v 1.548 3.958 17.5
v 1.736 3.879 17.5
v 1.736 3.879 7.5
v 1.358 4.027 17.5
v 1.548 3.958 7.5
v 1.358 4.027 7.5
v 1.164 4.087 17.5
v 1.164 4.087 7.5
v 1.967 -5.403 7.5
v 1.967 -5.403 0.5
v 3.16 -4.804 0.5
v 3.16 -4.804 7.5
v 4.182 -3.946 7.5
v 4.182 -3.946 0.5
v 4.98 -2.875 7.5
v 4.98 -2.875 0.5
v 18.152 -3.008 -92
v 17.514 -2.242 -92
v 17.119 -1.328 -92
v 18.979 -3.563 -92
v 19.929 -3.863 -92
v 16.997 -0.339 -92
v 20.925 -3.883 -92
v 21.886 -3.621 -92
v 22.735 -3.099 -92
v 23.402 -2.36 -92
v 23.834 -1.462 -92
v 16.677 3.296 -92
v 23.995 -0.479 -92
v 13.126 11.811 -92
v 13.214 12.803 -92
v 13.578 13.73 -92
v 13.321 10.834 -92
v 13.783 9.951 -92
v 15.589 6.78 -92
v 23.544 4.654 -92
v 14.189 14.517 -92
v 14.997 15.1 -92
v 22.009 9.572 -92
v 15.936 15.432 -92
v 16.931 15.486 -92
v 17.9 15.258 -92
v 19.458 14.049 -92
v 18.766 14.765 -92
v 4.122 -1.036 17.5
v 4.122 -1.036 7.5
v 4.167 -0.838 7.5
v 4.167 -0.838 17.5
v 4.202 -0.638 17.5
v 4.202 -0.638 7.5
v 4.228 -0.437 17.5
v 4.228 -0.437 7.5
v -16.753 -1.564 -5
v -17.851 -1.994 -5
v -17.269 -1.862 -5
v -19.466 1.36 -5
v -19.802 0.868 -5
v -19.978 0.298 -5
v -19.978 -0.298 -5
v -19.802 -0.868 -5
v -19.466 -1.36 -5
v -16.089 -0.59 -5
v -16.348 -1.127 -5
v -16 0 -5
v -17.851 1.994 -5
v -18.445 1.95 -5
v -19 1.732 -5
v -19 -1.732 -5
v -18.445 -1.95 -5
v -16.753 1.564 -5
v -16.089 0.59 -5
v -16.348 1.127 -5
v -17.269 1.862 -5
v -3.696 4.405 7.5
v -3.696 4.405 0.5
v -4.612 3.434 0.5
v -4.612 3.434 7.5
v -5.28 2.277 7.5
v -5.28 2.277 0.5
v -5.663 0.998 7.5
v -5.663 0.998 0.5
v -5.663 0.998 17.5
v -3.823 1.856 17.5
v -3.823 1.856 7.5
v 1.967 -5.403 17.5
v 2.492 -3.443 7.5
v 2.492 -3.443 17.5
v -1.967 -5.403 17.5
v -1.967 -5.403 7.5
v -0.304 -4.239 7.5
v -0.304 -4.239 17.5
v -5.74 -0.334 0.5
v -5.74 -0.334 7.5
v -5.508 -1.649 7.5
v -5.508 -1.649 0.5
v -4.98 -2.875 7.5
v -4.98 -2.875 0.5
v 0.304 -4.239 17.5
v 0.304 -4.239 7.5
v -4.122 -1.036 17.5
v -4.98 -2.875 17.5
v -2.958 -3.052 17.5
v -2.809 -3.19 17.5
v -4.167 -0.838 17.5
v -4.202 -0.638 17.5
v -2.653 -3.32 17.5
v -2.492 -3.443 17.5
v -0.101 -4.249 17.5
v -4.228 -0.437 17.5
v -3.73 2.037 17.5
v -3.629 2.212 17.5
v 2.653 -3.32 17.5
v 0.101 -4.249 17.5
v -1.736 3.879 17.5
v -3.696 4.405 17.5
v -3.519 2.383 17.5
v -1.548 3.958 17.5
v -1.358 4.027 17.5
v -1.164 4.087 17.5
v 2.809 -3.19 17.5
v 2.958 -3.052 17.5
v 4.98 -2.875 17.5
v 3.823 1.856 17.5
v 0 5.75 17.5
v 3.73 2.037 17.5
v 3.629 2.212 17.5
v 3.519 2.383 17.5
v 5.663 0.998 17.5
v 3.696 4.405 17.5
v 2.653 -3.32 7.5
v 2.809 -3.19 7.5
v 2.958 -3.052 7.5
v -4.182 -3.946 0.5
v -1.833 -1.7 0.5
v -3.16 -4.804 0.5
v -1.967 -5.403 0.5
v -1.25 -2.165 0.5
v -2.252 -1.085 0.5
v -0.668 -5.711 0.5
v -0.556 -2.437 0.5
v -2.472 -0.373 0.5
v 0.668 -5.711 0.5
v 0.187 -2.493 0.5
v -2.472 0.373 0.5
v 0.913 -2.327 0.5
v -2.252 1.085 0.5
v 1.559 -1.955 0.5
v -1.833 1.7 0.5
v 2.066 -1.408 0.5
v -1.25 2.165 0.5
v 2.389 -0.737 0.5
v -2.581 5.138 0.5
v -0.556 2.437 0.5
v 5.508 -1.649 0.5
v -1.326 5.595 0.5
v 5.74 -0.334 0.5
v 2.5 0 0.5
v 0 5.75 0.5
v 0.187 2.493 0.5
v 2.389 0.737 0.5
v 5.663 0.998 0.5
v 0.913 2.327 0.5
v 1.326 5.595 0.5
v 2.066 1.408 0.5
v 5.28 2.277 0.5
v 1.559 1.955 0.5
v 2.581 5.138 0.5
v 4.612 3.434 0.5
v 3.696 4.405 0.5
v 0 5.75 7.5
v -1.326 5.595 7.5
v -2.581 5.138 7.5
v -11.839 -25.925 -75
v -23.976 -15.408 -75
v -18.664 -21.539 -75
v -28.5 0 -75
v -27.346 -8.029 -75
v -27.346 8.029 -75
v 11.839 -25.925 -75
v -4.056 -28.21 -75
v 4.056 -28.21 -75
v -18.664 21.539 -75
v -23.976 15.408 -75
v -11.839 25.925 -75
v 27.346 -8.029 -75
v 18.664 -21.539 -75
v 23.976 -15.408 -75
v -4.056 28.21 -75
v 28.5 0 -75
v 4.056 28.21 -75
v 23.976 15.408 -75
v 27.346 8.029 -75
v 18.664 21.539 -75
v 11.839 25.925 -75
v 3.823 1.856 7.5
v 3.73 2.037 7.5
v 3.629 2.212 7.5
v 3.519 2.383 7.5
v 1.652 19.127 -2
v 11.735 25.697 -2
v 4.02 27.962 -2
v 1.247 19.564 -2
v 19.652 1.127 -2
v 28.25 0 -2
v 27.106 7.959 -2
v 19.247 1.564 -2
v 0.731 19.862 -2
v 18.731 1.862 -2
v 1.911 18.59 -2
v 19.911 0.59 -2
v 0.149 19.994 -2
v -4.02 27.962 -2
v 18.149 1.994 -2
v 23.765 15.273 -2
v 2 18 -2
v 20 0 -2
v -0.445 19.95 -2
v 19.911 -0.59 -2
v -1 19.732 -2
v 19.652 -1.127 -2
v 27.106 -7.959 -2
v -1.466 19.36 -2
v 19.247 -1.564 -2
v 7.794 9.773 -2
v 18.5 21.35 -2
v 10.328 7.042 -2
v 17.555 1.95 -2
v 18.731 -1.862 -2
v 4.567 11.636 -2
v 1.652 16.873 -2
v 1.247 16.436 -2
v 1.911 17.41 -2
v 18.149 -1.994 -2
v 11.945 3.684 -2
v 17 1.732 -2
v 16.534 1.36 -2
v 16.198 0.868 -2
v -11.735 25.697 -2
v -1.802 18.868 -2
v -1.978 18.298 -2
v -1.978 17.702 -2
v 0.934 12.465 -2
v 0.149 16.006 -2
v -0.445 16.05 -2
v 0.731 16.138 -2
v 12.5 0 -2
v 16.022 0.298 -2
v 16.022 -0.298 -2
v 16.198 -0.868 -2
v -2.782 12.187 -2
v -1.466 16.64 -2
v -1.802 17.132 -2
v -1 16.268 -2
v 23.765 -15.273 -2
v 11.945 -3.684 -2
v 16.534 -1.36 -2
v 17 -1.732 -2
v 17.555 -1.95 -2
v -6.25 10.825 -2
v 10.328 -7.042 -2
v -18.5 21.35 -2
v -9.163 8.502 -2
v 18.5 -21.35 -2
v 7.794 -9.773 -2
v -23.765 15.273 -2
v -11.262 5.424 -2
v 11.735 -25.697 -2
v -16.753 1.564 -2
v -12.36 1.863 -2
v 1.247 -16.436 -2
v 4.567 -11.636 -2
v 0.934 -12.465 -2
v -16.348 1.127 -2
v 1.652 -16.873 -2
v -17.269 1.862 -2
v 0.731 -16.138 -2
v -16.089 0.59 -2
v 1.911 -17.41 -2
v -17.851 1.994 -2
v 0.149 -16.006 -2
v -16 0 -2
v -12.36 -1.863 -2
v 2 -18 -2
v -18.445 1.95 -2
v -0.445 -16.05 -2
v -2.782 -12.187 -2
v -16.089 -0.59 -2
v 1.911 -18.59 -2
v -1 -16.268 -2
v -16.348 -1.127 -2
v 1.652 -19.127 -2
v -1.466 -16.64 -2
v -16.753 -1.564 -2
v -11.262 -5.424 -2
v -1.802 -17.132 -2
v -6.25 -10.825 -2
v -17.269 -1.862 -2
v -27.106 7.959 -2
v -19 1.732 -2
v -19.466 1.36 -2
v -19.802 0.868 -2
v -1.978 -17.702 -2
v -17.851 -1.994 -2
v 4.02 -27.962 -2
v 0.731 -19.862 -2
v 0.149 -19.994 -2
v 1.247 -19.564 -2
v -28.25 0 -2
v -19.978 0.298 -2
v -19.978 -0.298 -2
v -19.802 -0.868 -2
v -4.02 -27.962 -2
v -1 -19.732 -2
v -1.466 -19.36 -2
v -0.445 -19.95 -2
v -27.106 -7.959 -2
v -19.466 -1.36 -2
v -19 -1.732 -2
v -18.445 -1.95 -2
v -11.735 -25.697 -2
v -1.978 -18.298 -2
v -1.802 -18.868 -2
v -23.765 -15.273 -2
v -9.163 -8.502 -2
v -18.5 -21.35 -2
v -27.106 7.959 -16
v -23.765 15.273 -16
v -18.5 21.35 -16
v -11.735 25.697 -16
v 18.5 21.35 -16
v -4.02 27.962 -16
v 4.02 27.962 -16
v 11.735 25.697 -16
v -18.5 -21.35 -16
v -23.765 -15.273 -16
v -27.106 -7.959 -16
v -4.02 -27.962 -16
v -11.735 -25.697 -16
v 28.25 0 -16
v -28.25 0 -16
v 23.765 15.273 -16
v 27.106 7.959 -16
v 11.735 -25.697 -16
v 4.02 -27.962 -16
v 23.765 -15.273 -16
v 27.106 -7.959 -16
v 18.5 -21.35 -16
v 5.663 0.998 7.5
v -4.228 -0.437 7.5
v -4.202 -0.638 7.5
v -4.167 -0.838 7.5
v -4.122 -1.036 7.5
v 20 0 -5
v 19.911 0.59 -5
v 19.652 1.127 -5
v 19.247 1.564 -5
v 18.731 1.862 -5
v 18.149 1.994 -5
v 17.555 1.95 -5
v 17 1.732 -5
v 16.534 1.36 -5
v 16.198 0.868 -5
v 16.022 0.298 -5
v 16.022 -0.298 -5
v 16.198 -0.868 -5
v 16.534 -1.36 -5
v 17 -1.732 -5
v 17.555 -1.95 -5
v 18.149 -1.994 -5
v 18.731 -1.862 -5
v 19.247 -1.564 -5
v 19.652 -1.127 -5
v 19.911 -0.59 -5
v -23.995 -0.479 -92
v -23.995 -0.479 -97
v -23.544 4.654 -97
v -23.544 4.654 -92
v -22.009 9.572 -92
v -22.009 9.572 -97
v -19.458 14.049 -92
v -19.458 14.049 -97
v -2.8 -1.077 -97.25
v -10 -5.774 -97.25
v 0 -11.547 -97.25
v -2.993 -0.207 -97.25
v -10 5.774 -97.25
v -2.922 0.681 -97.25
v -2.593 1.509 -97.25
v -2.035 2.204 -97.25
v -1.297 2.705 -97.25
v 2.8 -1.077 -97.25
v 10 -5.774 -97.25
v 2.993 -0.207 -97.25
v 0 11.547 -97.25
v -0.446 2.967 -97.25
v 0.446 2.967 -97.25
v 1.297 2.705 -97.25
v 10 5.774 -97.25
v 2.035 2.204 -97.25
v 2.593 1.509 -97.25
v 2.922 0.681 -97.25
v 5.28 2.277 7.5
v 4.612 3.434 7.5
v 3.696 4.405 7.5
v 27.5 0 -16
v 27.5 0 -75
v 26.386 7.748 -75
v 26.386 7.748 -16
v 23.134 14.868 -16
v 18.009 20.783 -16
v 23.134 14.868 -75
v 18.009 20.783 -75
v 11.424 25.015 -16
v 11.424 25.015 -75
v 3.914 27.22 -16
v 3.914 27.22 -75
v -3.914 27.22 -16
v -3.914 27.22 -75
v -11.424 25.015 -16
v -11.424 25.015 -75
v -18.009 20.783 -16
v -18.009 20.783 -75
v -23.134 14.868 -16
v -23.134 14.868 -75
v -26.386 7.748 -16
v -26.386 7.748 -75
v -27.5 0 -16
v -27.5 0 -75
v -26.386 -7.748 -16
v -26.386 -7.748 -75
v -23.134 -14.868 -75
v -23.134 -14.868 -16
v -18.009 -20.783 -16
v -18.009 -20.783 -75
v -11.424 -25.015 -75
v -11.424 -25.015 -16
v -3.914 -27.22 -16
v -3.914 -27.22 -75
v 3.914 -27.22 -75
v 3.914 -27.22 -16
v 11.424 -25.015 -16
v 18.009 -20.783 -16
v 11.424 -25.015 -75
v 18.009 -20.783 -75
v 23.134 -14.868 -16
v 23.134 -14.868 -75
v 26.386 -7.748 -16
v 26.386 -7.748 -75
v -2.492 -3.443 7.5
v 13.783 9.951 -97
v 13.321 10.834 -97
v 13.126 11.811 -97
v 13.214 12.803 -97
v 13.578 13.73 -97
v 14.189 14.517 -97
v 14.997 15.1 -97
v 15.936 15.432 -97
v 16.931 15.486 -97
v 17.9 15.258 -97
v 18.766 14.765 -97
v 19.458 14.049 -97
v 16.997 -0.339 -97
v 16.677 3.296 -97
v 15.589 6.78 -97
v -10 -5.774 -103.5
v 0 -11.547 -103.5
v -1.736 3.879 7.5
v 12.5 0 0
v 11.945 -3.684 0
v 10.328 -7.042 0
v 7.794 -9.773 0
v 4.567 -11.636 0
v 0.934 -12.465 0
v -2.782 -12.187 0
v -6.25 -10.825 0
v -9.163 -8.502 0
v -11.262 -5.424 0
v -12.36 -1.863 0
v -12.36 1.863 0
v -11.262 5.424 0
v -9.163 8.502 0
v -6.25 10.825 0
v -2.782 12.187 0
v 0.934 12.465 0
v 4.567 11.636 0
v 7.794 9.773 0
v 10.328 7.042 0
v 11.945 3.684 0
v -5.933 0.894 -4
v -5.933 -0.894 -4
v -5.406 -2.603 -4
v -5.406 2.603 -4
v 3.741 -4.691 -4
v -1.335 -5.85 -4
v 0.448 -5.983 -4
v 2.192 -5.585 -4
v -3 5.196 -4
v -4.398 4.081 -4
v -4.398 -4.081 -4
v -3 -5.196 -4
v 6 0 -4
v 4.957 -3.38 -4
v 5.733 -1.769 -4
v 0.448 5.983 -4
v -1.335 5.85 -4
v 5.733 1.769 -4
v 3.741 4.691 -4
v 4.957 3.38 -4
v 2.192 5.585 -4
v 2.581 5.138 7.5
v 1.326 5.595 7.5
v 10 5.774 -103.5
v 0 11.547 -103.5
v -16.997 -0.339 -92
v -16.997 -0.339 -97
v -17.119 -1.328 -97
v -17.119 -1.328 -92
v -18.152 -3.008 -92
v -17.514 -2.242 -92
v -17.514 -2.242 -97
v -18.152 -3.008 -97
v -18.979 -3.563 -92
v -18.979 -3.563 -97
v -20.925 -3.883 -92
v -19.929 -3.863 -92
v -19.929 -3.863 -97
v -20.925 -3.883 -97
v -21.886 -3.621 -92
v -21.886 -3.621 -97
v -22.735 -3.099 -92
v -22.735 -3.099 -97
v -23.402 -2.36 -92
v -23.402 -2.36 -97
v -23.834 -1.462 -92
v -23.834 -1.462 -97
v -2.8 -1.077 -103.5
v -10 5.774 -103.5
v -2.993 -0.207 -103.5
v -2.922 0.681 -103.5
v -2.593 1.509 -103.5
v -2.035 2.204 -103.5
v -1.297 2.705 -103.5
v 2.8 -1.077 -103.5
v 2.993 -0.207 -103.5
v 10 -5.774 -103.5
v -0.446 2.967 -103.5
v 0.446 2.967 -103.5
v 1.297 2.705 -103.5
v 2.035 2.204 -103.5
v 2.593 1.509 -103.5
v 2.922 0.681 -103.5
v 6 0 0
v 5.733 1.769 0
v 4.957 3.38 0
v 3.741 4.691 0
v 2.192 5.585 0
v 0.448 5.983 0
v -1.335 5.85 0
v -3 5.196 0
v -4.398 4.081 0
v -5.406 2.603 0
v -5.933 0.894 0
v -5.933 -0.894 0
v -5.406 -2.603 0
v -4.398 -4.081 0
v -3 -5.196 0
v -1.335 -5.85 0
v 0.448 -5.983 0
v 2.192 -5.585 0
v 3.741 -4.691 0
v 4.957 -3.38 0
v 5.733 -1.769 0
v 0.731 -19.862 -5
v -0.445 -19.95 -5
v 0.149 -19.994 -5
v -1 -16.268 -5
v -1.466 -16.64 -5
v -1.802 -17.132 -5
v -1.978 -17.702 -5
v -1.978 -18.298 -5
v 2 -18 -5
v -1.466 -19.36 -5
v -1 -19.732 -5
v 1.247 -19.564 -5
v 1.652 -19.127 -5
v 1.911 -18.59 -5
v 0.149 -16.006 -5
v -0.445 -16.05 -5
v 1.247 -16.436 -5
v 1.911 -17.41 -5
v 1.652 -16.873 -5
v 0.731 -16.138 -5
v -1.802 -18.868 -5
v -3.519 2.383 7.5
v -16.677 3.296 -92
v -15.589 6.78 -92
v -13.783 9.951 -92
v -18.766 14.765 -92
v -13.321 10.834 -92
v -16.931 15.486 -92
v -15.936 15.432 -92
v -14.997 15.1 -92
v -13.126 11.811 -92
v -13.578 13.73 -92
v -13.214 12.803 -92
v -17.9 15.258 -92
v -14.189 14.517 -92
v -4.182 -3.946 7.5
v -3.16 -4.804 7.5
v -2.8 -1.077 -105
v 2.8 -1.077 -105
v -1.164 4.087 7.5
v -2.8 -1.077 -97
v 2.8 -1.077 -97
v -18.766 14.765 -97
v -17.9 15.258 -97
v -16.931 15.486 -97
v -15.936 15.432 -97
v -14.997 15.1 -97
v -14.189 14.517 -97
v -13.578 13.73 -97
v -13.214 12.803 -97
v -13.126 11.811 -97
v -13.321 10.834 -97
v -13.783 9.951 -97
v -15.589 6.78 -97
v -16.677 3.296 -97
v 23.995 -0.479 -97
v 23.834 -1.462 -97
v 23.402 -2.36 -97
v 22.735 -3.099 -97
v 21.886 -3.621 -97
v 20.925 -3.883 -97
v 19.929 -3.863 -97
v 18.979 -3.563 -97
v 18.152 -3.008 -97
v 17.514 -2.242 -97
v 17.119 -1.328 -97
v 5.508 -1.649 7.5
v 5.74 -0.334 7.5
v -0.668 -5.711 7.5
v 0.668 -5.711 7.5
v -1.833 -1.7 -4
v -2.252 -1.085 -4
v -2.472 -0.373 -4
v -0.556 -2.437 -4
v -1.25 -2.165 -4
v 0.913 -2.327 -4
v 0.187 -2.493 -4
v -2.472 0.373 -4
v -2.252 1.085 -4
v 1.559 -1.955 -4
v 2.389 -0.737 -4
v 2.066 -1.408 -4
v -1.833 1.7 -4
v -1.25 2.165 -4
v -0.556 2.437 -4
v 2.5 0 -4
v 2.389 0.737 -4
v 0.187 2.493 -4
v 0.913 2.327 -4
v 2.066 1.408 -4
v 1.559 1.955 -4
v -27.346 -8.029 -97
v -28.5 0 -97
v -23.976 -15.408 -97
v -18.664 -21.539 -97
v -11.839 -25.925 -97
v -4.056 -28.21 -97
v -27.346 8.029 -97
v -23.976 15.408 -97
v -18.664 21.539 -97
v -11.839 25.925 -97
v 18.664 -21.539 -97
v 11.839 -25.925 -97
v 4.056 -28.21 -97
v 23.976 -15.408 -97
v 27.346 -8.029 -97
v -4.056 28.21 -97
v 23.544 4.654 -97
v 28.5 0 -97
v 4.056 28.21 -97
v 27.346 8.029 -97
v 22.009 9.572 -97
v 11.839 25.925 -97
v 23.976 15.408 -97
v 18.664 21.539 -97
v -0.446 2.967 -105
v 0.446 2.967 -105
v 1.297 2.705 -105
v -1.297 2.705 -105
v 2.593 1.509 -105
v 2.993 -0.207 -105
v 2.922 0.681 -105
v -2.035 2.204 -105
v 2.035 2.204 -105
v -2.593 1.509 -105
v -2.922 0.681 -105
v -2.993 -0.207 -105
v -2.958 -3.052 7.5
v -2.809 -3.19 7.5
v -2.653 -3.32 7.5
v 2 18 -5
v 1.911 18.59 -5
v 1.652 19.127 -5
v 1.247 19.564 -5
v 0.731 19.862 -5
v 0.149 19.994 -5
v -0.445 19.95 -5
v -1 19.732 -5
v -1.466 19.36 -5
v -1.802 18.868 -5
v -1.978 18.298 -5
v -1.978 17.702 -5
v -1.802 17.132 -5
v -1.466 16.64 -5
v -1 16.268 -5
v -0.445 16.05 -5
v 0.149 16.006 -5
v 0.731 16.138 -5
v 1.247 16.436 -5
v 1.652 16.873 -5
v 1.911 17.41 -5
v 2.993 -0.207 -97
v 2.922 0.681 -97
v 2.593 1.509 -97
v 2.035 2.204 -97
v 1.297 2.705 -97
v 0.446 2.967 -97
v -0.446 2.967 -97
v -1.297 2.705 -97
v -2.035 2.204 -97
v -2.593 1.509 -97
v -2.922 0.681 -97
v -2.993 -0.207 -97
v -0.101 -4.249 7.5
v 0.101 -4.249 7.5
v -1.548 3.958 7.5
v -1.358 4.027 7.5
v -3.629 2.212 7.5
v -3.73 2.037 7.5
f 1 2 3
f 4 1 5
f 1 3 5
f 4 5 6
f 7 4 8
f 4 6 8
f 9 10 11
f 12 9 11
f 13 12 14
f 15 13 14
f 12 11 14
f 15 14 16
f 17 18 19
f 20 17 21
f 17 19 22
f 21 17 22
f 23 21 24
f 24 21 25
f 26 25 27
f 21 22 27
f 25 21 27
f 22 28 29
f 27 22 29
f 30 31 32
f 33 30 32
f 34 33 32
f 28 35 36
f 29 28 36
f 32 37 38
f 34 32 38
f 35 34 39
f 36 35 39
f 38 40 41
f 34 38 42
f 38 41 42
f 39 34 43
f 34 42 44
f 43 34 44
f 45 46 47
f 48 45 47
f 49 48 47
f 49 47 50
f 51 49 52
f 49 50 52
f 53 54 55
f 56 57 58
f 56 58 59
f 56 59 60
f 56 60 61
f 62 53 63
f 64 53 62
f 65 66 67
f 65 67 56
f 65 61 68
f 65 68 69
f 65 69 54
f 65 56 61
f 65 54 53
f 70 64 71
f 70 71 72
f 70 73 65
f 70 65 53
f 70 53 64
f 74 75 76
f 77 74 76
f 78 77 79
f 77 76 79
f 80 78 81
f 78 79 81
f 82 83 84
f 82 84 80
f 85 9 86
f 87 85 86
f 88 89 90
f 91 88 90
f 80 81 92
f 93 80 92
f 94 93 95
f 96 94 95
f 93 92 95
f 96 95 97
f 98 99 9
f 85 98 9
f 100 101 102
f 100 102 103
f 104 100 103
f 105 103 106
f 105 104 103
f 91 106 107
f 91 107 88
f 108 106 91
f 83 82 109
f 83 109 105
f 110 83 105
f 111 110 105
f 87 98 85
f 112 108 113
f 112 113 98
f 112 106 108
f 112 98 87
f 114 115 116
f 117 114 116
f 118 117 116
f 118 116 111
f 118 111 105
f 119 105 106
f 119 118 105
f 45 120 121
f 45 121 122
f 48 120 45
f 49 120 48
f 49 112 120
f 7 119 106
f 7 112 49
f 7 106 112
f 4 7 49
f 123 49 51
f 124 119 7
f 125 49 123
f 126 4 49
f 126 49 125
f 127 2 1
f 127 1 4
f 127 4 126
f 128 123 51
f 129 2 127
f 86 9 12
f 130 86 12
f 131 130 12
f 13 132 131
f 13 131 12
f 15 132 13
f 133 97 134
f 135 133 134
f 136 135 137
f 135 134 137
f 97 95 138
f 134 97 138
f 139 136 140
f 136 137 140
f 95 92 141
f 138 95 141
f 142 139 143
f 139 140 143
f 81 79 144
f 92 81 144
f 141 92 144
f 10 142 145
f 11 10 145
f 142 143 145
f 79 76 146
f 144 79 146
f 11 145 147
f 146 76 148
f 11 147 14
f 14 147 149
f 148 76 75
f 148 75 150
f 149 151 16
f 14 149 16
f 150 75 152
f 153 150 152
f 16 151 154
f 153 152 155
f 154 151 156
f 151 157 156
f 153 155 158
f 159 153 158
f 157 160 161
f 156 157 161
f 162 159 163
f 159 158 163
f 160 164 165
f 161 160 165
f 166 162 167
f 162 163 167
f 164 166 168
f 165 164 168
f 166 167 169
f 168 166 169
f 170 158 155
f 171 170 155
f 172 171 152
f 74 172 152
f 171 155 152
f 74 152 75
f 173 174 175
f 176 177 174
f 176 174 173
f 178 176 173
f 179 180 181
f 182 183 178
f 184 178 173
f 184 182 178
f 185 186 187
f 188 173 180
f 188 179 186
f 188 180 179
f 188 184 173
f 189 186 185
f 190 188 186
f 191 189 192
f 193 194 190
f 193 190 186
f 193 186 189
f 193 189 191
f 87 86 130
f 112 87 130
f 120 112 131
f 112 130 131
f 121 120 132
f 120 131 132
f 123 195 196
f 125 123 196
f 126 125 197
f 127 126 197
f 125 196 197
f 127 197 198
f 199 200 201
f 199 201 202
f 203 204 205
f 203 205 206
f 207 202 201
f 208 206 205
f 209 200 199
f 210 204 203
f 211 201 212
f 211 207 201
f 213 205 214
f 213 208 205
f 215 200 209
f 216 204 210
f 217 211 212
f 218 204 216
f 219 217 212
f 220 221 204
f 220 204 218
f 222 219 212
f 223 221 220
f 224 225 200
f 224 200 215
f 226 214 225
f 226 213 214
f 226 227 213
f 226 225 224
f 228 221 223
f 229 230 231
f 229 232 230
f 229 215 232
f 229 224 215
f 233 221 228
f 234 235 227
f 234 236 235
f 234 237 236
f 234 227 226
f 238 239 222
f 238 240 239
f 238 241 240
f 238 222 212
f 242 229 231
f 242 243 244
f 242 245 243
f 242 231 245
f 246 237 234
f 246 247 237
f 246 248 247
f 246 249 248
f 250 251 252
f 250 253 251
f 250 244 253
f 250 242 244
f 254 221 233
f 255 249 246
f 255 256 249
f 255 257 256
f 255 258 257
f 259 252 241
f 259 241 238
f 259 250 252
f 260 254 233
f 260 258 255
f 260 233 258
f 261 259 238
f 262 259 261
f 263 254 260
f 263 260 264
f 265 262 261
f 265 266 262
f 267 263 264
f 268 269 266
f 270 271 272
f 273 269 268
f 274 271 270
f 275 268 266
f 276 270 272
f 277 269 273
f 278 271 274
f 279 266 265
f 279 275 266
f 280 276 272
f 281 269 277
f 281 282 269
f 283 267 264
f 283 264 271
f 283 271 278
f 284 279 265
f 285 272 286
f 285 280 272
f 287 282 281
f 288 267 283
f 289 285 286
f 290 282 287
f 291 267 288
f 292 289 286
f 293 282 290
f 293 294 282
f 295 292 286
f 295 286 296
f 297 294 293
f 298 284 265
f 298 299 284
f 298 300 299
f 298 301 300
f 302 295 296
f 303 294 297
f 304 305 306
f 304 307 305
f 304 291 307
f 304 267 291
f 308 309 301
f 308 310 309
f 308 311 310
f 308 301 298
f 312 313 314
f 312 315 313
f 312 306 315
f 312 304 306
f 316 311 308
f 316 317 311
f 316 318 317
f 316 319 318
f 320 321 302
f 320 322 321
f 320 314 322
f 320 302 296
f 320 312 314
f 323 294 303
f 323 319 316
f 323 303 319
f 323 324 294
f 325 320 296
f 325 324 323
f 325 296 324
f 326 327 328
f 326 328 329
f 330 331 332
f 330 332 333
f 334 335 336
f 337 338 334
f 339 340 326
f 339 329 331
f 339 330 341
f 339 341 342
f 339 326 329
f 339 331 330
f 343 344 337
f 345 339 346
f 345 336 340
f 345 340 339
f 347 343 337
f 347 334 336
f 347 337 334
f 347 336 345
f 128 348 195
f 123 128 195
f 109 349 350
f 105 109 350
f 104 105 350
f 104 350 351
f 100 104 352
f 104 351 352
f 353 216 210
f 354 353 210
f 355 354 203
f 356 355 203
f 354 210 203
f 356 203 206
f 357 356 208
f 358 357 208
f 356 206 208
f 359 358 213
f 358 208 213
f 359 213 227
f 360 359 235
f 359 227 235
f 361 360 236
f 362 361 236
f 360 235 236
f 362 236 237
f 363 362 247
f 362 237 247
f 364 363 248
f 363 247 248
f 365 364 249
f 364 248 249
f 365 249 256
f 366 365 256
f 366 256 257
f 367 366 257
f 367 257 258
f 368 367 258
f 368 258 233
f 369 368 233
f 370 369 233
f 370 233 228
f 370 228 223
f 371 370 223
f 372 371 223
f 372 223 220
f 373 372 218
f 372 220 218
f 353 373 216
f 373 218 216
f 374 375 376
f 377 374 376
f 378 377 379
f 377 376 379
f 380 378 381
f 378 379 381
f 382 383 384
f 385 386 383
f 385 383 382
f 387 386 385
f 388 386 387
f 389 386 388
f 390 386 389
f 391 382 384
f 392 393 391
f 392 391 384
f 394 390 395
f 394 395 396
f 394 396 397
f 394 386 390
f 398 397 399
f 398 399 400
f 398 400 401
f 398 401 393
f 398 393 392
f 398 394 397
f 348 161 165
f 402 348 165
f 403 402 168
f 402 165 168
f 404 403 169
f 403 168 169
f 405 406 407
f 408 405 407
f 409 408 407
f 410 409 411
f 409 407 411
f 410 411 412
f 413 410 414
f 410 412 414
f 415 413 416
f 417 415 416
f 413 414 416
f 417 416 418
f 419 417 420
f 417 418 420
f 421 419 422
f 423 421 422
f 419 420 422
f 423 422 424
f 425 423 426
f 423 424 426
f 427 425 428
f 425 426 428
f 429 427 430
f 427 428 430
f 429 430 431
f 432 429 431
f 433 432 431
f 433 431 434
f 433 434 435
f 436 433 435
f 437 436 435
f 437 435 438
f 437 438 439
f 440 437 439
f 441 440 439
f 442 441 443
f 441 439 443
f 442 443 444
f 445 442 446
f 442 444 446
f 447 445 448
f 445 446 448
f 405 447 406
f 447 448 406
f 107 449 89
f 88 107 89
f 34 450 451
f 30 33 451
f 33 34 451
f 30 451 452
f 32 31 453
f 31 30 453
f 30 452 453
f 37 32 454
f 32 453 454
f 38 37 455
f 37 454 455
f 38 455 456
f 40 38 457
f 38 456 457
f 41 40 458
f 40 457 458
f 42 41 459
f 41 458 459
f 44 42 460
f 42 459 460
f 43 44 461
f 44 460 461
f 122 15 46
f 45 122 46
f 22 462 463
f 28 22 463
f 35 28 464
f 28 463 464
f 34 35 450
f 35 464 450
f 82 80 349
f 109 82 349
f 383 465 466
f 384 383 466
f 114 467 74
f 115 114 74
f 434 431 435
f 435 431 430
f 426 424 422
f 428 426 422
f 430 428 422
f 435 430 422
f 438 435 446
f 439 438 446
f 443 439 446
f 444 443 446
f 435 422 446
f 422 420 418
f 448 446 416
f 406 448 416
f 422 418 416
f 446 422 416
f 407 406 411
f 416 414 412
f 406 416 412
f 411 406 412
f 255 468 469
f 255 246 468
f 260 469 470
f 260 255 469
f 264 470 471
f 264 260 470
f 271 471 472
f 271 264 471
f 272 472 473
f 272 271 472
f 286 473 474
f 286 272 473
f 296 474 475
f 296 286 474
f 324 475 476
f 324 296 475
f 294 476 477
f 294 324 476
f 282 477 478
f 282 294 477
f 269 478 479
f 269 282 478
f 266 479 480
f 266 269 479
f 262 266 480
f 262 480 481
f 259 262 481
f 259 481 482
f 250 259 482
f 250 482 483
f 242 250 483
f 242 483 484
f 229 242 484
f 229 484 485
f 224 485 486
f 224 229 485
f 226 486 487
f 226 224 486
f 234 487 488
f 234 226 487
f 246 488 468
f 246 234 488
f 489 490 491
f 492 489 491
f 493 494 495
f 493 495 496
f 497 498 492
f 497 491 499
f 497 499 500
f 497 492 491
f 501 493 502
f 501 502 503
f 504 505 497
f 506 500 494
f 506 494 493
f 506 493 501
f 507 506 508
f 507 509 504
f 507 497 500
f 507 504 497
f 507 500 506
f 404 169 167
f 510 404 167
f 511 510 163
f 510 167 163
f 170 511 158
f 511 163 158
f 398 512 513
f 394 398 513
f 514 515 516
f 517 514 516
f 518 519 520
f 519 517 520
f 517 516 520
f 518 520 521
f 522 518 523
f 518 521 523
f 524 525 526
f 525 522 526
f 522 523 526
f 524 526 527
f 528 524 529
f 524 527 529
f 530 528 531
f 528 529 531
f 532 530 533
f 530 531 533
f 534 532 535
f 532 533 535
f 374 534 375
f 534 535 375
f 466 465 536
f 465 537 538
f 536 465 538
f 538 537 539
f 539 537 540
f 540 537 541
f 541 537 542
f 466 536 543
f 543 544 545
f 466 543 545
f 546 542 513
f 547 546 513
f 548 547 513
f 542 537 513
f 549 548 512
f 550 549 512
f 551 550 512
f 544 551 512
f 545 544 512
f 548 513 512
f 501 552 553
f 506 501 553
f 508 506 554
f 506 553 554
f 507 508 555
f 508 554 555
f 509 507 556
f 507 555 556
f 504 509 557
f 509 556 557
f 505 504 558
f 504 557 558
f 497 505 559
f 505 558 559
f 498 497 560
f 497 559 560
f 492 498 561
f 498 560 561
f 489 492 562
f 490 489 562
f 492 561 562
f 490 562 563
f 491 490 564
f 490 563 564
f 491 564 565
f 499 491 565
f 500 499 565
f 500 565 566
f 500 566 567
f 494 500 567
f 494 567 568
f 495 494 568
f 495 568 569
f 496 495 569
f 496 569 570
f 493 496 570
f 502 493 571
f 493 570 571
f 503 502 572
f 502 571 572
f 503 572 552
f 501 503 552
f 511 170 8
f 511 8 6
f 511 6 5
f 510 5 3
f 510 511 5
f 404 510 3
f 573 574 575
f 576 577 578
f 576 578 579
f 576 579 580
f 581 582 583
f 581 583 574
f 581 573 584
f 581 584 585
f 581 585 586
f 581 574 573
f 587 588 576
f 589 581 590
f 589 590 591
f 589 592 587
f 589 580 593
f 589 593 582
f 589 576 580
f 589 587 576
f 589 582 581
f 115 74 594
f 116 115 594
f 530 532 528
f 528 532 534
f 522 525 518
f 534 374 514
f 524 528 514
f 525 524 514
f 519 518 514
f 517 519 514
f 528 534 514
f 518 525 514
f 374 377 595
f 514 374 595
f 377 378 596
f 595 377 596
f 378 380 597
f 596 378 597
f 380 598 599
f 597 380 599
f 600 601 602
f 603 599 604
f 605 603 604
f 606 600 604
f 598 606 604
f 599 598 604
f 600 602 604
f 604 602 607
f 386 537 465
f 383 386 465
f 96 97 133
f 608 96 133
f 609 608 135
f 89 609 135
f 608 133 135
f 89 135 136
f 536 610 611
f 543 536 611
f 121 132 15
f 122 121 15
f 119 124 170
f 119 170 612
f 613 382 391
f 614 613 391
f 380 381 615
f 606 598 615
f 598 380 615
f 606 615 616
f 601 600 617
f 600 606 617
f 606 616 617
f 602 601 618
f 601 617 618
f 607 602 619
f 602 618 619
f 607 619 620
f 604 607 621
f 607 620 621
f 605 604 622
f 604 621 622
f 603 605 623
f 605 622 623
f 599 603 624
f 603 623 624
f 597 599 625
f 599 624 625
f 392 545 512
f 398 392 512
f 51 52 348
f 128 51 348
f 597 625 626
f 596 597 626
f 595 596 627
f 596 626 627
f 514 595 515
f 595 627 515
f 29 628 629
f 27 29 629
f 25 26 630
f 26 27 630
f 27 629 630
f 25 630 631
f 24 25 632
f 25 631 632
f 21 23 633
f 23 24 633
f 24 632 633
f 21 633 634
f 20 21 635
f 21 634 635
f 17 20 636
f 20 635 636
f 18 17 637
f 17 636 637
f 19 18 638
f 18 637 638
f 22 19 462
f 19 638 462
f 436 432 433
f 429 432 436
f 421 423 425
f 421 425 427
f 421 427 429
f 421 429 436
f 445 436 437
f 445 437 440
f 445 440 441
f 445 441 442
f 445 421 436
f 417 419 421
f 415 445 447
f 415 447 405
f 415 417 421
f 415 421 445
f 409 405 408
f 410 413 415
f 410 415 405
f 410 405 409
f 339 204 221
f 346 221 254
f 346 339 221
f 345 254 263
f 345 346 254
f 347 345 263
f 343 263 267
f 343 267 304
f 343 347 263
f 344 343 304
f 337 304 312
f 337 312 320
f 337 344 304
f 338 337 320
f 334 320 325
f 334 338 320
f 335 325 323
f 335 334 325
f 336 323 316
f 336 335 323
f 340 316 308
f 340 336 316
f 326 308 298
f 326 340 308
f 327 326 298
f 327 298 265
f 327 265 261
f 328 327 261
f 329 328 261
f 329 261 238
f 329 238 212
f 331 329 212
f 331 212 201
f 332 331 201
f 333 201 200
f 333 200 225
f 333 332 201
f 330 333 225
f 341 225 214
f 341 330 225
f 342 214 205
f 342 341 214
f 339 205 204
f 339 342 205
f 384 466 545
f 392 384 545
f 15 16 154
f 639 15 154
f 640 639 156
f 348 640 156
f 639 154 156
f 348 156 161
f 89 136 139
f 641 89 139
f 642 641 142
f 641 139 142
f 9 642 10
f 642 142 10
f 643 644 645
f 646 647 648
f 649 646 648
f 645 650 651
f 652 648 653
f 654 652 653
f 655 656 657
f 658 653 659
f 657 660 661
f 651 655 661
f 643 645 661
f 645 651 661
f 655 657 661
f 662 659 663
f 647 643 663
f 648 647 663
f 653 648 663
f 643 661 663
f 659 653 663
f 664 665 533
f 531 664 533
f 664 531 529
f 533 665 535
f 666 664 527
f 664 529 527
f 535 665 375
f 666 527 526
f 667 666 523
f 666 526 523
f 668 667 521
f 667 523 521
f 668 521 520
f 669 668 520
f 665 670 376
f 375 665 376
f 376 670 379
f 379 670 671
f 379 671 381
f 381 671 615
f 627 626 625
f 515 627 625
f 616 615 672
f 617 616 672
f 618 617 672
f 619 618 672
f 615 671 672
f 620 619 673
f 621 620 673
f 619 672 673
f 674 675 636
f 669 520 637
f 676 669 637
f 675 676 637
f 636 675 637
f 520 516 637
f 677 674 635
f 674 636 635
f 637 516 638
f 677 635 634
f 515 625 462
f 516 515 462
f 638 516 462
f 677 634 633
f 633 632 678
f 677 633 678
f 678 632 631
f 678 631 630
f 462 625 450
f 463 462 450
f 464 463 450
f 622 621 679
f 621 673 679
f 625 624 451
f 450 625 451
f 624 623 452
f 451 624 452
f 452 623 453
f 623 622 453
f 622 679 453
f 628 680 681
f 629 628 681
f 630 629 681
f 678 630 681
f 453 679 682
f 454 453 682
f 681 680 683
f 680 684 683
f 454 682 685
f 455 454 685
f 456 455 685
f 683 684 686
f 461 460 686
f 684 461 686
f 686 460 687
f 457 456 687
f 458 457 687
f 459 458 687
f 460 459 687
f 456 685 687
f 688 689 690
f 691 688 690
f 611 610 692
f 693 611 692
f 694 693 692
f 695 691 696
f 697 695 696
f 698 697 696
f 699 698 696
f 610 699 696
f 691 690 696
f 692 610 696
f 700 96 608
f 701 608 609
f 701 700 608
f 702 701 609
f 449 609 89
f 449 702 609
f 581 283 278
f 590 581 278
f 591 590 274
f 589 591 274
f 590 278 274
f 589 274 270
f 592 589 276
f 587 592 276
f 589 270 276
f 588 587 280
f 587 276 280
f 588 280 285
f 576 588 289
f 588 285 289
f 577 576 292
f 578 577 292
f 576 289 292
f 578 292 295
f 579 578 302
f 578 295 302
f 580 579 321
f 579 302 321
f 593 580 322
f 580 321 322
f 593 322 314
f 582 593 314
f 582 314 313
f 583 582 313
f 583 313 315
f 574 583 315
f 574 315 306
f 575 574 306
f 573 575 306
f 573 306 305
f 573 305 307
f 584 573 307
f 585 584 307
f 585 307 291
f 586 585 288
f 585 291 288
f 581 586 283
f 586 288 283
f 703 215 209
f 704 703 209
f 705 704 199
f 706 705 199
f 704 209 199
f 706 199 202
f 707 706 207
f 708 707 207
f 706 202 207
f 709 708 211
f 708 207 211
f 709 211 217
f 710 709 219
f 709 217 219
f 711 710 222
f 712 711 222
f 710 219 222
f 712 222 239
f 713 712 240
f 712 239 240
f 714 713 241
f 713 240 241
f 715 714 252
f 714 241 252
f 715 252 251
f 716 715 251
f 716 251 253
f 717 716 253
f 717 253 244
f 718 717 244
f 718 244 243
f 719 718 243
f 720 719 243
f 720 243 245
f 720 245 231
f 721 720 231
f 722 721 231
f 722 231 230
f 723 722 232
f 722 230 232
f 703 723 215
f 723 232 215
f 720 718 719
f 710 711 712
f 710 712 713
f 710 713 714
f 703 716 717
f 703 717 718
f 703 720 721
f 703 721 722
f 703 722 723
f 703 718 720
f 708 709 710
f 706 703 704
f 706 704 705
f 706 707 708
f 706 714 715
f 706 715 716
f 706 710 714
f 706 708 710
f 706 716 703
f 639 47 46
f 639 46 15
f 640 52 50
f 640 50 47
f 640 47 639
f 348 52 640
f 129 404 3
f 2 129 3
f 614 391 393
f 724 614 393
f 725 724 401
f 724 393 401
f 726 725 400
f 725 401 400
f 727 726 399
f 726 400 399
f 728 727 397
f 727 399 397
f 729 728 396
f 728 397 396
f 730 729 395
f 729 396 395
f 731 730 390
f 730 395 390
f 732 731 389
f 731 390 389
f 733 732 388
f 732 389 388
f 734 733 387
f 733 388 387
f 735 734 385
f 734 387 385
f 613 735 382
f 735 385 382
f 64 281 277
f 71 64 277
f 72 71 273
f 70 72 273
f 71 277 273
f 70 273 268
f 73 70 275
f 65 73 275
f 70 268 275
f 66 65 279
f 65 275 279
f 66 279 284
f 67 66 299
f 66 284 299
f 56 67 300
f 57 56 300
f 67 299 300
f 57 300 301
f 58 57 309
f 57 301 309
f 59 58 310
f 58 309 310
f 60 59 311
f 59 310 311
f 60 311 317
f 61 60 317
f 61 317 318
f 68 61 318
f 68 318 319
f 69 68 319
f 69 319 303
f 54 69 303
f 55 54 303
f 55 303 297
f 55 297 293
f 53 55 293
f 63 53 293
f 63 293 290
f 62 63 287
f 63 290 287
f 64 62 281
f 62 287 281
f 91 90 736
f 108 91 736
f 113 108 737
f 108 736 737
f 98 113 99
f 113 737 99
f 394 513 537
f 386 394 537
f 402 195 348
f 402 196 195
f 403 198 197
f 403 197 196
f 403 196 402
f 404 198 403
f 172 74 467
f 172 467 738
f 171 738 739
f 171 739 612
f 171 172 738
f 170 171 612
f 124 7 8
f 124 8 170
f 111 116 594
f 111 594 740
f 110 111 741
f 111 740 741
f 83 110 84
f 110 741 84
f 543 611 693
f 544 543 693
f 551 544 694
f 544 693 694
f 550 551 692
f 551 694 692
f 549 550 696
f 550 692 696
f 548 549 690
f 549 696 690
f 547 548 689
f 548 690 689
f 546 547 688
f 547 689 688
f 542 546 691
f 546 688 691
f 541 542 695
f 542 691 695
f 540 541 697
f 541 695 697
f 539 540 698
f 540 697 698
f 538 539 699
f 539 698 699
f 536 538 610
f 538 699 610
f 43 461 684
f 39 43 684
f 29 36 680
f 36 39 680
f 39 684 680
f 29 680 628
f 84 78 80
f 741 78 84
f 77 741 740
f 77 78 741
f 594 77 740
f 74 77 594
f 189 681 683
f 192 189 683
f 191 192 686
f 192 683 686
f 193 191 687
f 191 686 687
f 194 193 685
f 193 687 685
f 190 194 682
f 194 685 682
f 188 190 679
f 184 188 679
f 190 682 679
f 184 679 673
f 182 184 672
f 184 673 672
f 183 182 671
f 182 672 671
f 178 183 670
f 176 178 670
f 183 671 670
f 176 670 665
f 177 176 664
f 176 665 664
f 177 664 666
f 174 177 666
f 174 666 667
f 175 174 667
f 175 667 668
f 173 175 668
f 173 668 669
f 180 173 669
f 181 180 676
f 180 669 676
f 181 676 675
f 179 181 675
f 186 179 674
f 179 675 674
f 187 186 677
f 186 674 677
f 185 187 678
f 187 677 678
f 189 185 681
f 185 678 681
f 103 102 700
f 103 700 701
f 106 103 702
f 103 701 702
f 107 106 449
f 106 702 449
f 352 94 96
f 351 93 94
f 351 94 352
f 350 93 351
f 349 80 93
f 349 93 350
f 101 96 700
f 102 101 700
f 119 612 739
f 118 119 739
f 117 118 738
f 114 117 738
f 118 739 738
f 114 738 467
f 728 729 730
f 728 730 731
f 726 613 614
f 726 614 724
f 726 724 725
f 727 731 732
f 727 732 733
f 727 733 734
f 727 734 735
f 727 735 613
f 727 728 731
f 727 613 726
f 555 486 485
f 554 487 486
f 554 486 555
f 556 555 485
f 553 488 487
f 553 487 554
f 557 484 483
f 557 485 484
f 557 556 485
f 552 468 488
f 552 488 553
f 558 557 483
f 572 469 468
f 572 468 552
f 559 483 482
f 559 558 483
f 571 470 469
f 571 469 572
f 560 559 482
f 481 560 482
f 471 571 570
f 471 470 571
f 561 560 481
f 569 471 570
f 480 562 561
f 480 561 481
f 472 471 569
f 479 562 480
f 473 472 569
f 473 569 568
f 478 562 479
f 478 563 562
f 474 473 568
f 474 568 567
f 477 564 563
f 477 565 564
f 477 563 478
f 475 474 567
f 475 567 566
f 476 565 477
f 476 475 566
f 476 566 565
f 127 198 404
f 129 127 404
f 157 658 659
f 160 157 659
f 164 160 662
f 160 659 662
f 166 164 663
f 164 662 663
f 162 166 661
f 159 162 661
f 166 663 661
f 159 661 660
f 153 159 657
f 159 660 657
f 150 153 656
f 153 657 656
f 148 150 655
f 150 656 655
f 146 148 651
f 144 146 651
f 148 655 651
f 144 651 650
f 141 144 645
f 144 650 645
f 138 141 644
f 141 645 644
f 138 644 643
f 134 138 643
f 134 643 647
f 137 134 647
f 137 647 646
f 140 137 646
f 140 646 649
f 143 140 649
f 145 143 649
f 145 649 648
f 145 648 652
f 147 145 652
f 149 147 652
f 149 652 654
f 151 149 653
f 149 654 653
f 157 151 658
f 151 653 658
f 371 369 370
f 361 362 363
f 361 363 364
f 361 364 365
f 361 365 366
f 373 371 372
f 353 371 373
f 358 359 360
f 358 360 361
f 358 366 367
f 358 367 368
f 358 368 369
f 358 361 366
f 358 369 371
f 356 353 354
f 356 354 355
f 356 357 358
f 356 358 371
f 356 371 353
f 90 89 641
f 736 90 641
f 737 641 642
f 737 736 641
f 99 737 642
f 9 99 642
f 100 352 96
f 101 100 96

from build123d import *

# Parameters (mm, degrees)
SKETCH5_R           = 2
CUT_EXTRUDE1_DEPTH  = 3
SKETCH13_R          = 6
CUT_EXTRUDE3_DEPTH  = 4
SKETCH14_R          = 2.5
BOSS_EXTRUDE2_DEPTH = 4.5
SKETCH15_R          = 5.75
BOSS_EXTRUDE3_DEPTH = 17
CUT_EXTRUDE7_START  = -10
CUT_EXTRUDE7_DEPTH  = 10
CUT_EXTRUDE9_DEPTH  = 8
BOSS_EXTRUDE7_DEPTH = 6.25
CUT_EXTRUDE10_DEPTH = 5
SPLIT1_START        = -97
SPLIT1_OUTLINE_R    = 28.5
SPLIT1_DEPTH        = 22
SPLIT1_START_2      = -92
SPLIT1_2_DEPTH      = 17
SPLIT1_START_3      = -75
SPLIT1_3_OUTLINE_R  = 27.5
SPLIT1_3_DEPTH      = 59
SPLIT1_START_4      = -105
SPLIT1_4_OUTLINE_R  = 28.5
SPLIT1_4_DEPTH      = 89
SPLIT1_START_5      = -4
SPLIT1_5_OUTLINE_R  = 5.75
SPLIT1_5_DEPTH      = 21.5
SPLIT1_START_6      = 0.5
SPLIT1_6_DEPTH      = 17
SPLIT1_7_DEPTH      = 7
SPLIT1_8_OUTLINE_R  = 2.5
SPLIT1_8_DEPTH      = 4.5
SPLIT1_START_7      = -103.5
SPLIT1_9_DEPTH      = 6.25
SPLIT1_10_DEPTH     = 8


# Read off the part's stored shape, not the designer's step: Split1
with BuildPart() as part:
    # Sketch3 → Revolve1 (revolve)
    with BuildSketch(Plane(origin=(0, 0, 0), x_dir=(0, 0, -1), z_dir=(1, 0, 0)), mode=Mode.PRIVATE) as revolve1_sk:
        Polygon((0, 0), (0, 12.5), (2, 12.5), (2, 28.25), (16, 28.25), (16, 27.5), (75, 27.5), (75, 28.5), (97, 28.5), (97, 3), (105, 3), (105, 0), (97, 0), align=None)
    revolve(revolve1_sk.sketch.rotate(Axis((0, 0, 94.008643936), (0, 0, -1)), 90), axis=Axis((0, 0, 94.008643936), (0, 0, -1)))

    # Sketch5 → Cut-Extrude1 (cut)
    with BuildSketch(Plane.XY.offset(-2)):
        with Locations((0, 18)):
            Circle(SKETCH5_R)
        with Locations((18, 0)):
            Circle(SKETCH5_R)
        with Locations((0, -18)):
            Circle(SKETCH5_R)
        with Locations((-18, 0)):
            Circle(SKETCH5_R)
    extrude(amount=-CUT_EXTRUDE1_DEPTH, mode=Mode.SUBTRACT)

    # Sketch13 → Cut-Extrude3 (cut)
    with BuildSketch(Plane.XY):
        Circle(SKETCH13_R)
    extrude(amount=-CUT_EXTRUDE3_DEPTH, mode=Mode.SUBTRACT)

    # Sketch14 → Boss-Extrude2 (add)
    with BuildSketch(Plane.XY.offset(-4)):
        Circle(SKETCH14_R)
    extrude(amount=BOSS_EXTRUDE2_DEPTH)

    # Sketch15 → Boss-Extrude3 (add)
    with BuildSketch(Plane.XY.offset(0.5)):
        Circle(SKETCH15_R)
    extrude(amount=BOSS_EXTRUDE3_DEPTH)

    # Sketch17 → Cut-Extrude7 (cut)
    with BuildSketch(Plane.XY.offset(17.5).offset(CUT_EXTRUDE7_START)):
        with BuildLine():
            Line((-1.164124293, 4.087458211), (0, 5.75))
            ThreePointArc((0, 5.75), (-1.966615824, 5.40323257), (-3.696028756, 4.404755548))
            Line((-3.696028756, 4.404755548), (-1.735596548, 3.879459321))
            ThreePointArc((-1.735596548, 3.879459321), (-1.453585609, 3.993693638), (-1.164124293, 4.087458211))
        make_face()
        with BuildLine():
            Line((-3.519138439, 2.382889978), (-3.696028756, 4.404755548))
            ThreePointArc((-3.696028756, 4.404755548), (-4.979646072, 2.875), (-5.66264458, 0.998477022))
            Line((-5.66264458, 0.998477022), (-3.823212475, 1.856218299))
            ThreePointArc((-3.823212475, 1.856218299), (-3.680607966, 2.125), (-3.519138439, 2.382889978))
        make_face()
        with BuildLine():
            Line((-4.227508599, -0.436658959), (-5.66264458, 0.998477022))
            ThreePointArc((-5.66264458, 0.998477022), (-5.66264458, -0.998477022), (-4.979646072, -2.875))
            Line((-4.979646072, -2.875), (-4.121904795, -1.035567895))
            ThreePointArc((-4.121904795, -1.035567895), (-4.18543295, -0.738004755), (-4.227508599, -0.436658959))
        make_face()
        with BuildLine():
            Line((-2.957780502, -3.051890317), (-4.979646072, -2.875))
            ThreePointArc((-4.979646072, -2.875), (-3.696028756, -4.404755548), (-1.966615824, -5.40323257))
            Line((-1.966615824, -5.40323257), (-2.491912051, -3.442800362))
            ThreePointArc((-2.491912051, -3.442800362), (-2.731847341, -3.255688883), (-2.957780502, -3.051890317))
        make_face()
        with BuildLine():
            Line((-0.304074036, -4.239108277), (-1.966615824, -5.40323257))
            ThreePointArc((-1.966615824, -5.40323257), (0, -5.75), (1.966615824, -5.40323257))
            Line((1.966615824, -5.40323257), (0.304074036, -4.239108277))
            ThreePointArc((0.304074036, -4.239108277), (0, -4.25), (-0.304074036, -4.239108277))
        make_face()
        with BuildLine():
            ThreePointArc((1.966615824, -5.40323257), (3.696028756, -4.404755548), (4.979646072, -2.875))
            Line((4.979646072, -2.875), (2.957780502, -3.051890317))
            ThreePointArc((2.957780502, -3.051890317), (2.731847341, -3.255688883), (2.491912051, -3.442800362))
            Line((2.491912051, -3.442800362), (1.966615824, -5.40323257))
        make_face()
        with BuildLine():
            ThreePointArc((5.75, 0), (5.728119514, 0.501145521), (5.66264458, 0.998477022))
            Line((5.66264458, 0.998477022), (4.227508599, -0.436658959))
            ThreePointArc((4.227508599, -0.436658959), (4.18543295, -0.738004755), (4.121904795, -1.035567895))
            Line((4.121904795, -1.035567895), (4.979646072, -2.875))
            ThreePointArc((4.979646072, -2.875), (5.554073501, -1.488209509), (5.75, 0))
        make_face()
        with BuildLine():
            ThreePointArc((5.66264458, 0.998477022), (4.979646072, 2.875), (3.696028756, 4.404755548))
            Line((3.696028756, 4.404755548), (3.519138439, 2.382889978))
            ThreePointArc((3.519138439, 2.382889978), (3.680607966, 2.125), (3.823212475, 1.856218299))
            Line((3.823212475, 1.856218299), (5.66264458, 0.998477022))
        make_face()
        with BuildLine():
            ThreePointArc((3.696028756, 4.404755548), (1.966615824, 5.40323257), (0, 5.75))
            Line((0, 5.75), (1.164124293, 4.087458211))
            ThreePointArc((1.164124293, 4.087458211), (1.453585609, 3.993693638), (1.735596548, 3.879459321))
            Line((1.735596548, 3.879459321), (3.696028756, 4.404755548))
        make_face()
    extrude(amount=CUT_EXTRUDE7_DEPTH, mode=Mode.SUBTRACT)

    # Sketch24 → Cut-Extrude9 (cut)
    with BuildSketch(Plane(origin=(0, 0, -105), x_dir=(-1, 0, 0), z_dir=(0, 0, -1))):
        with BuildLine():
            Line((-2.8, -1.077032961), (2.8, -1.077032961))
            ThreePointArc((2.8, -1.077032961), (0, -3), (-2.8, -1.077032961))
        make_face()
    extrude(amount=-CUT_EXTRUDE9_DEPTH, mode=Mode.SUBTRACT)

    # Sketch26 → Boss-Extrude7 (add)
    with BuildSketch(Plane(origin=(0, 0, -103.5), x_dir=(-1, 0, 0), z_dir=(0, 0, -1))):
        Polygon((0, 11.547005384), (-10, 5.773502692), (-10, -5.773502692), (0, -11.547005384), (10, -5.773502692), (10, 5.773502692), align=None)
    extrude(amount=-BOSS_EXTRUDE7_DEPTH)

    # Sketch27 → Cut-Extrude10 (cut)
    with BuildSketch(Plane(origin=(0, 0, -97), x_dir=(-1, 0, 0), z_dir=(0, 0, -1))):
        with BuildLine():
            ThreePointArc((23.995222971, -0.478826225), (22.908918278, 7.154122122), (19.458462601, 14.048780488))
            ThreePointArc((19.458462601, 14.048780488), (14.571989651, 14.837692463), (13.783077676, 9.951219512))
            ThreePointArc((13.783077676, 9.951219512), (16.227150447, 5.06750317), (16.996616271, -0.339168576))
            ThreePointArc((16.996616271, -0.339168576), (20.426090797, -3.908300751), (23.995222971, -0.478826225))
        make_face()
        with BuildLine():
            ThreePointArc((-23.995222971, -0.478826225), (-22.908918278, 7.154122122), (-19.458462601, 14.048780488))
            ThreePointArc((-19.458462601, 14.048780488), (-14.571989651, 14.837692463), (-13.783077676, 9.951219512))
            ThreePointArc((-13.783077676, 9.951219512), (-16.227150447, 5.06750317), (-16.996616271, -0.339168576))
            ThreePointArc((-16.996616271, -0.339168576), (-20.426090797, -3.908300751), (-23.995222971, -0.478826225))
        make_face()
    extrude(amount=-CUT_EXTRUDE10_DEPTH, mode=Mode.SUBTRACT)

    # Split1 4 outline → Split1 4 (cut)
    with BuildSketch(Plane.XY.offset(SPLIT1_START_4)):
        Circle(SPLIT1_4_OUTLINE_R)
    extrude(amount=SPLIT1_4_DEPTH, mode=Mode.SUBTRACT)

    # Split1 5 outline → Split1 5 (cut)
    with BuildSketch(Plane.XY.offset(SPLIT1_START_5)):
        Circle(SPLIT1_5_OUTLINE_R)
    extrude(amount=SPLIT1_5_DEPTH, mode=Mode.SUBTRACT)


with BuildPart() as body_2:
    # Split1 outline → Split1 (new body)
    with BuildSketch(Plane.XY.offset(SPLIT1_START)):
        Circle(SPLIT1_OUTLINE_R)
        with BuildLine():
            ThreePointArc((-13.783077676, 9.951219512), (-16.227150447, 5.06750317), (-16.996616271, -0.339168576))
            ThreePointArc((-16.996616271, -0.339168576), (-20.426090796, -3.908300751), (-23.995222971, -0.478826225))
            ThreePointArc((-23.995222971, -0.478826225), (-22.908918278, 7.154122122), (-19.458462601, 14.048780488))
            ThreePointArc((-19.458462601, 14.048780488), (-14.57198965, 14.837692463), (-13.783077676, 9.951219512))
        make_face(mode=Mode.SUBTRACT)
        with BuildLine():
            ThreePointArc((19.458462601, 14.048780488), (22.908918278, 7.154122122), (23.995222971, -0.478826225))
            ThreePointArc((23.995222971, -0.478826225), (20.426090796, -3.908300751), (16.996616271, -0.339168576))
            ThreePointArc((16.996616271, -0.339168576), (16.227150447, 5.06750317), (13.783077676, 9.951219512))
            ThreePointArc((13.783077676, 9.951219512), (14.57198965, 14.837692463), (19.458462601, 14.048780488))
        make_face(mode=Mode.SUBTRACT)
    extrude(amount=SPLIT1_DEPTH)

    # Split1 2 outline → Split1 2 (add)
    with BuildSketch(Plane.XY.offset(SPLIT1_START_2)):
        with BuildLine():
            ThreePointArc((16.996616271, -0.339168576), (20.426090796, -3.908300751), (23.995222971, -0.478826225))
            ThreePointArc((23.995222971, -0.478826225), (22.908918278, 7.154122122), (19.458462601, 14.048780488))
            ThreePointArc((19.458462601, 14.048780488), (14.57198965, 14.837692463), (13.783077676, 9.951219512))
            ThreePointArc((13.783077676, 9.951219512), (16.227150447, 5.06750317), (16.996616271, -0.339168576))
        make_face()
        with BuildLine():
            ThreePointArc((-23.995222971, -0.478826225), (-20.426090796, -3.908300751), (-16.996616271, -0.339168576))
            ThreePointArc((-16.996616271, -0.339168576), (-16.227150447, 5.06750317), (-13.783077676, 9.951219512))
            ThreePointArc((-13.783077676, 9.951219512), (-14.57198965, 14.837692463), (-19.458462601, 14.048780488))
            ThreePointArc((-19.458462601, 14.048780488), (-22.908918278, 7.154122122), (-23.995222971, -0.478826225))
        make_face()
    extrude(amount=SPLIT1_2_DEPTH)


with BuildPart() as body_3:
    # Split1 3 outline → Split1 3 (new body)
    with BuildSketch(Plane.XY.offset(SPLIT1_START_3)):
        Circle(SPLIT1_3_OUTLINE_R)
    extrude(amount=SPLIT1_3_DEPTH)


with BuildPart() as body_4:
    # Split1 6 outline → Split1 6 (new body)
    with BuildSketch(Plane.XY.offset(SPLIT1_START_6)):
        with BuildLine():
            Line((4.227508599, -0.436658959), (5.66264458, 0.998477022))
            Line((5.66264458, 0.998477022), (3.823212475, 1.856218299))
            ThreePointArc((3.823212475, 1.856218299), (3.680607966, 2.125), (3.519138439, 2.382889978))
            Line((3.519138439, 2.382889978), (3.696028756, 4.404755548))
            Line((3.696028756, 4.404755548), (1.735596548, 3.879459321))
            ThreePointArc((1.735596548, 3.879459321), (1.453585609, 3.993693638), (1.164124293, 4.087458211))
            Line((1.164124293, 4.087458211), (0, 5.75))
            Line((0, 5.75), (-1.164124293, 4.087458211))
            ThreePointArc((-1.164124293, 4.087458211), (-1.453585609, 3.993693638), (-1.735596548, 3.879459321))
            Line((-1.735596548, 3.879459321), (-3.696028756, 4.404755548))
            Line((-3.696028756, 4.404755548), (-3.519138439, 2.382889978))
            ThreePointArc((-3.519138439, 2.382889978), (-3.680607966, 2.125), (-3.823212475, 1.856218299))
            Line((-3.823212475, 1.856218299), (-5.66264458, 0.998477022))
            Line((-5.66264458, 0.998477022), (-4.227508599, -0.436658959))
            ThreePointArc((-4.227508599, -0.436658959), (-4.18543295, -0.738004755), (-4.121904795, -1.035567895))
            Line((-4.121904795, -1.035567895), (-4.979646072, -2.875))
            Line((-4.979646072, -2.875), (-2.957780502, -3.051890317))
            ThreePointArc((-2.957780502, -3.051890317), (-2.731847341, -3.255688883), (-2.491912051, -3.442800362))
            Line((-2.491912051, -3.442800362), (-1.966615824, -5.40323257))
            Line((-1.966615824, -5.40323257), (-0.304074036, -4.239108277))
            ThreePointArc((-0.304074036, -4.239108277), (0, -4.25), (0.304074036, -4.239108277))
            Line((0.304074036, -4.239108277), (1.966615824, -5.40323257))
            Line((1.966615824, -5.40323257), (2.491912051, -3.442800362))
            ThreePointArc((2.491912051, -3.442800362), (2.731847341, -3.255688883), (2.957780502, -3.051890317))
            Line((2.957780502, -3.051890317), (4.979646072, -2.875))
            Line((4.979646072, -2.875), (4.121904795, -1.035567895))
            ThreePointArc((4.121904795, -1.035567895), (4.18543295, -0.738004755), (4.227508599, -0.436658959))
        make_face()
    extrude(amount=SPLIT1_6_DEPTH)

    # Split1 7 outline → Split1 7 (add)
    with BuildSketch(Plane.XY.offset(SPLIT1_START_6)):
        with BuildLine():
            ThreePointArc((4.979646072, -2.875), (5.66264458, -0.998477021), (5.66264458, 0.998477022))
            Line((5.66264458, 0.998477022), (4.227508599, -0.436658959))
            ThreePointArc((4.227508599, -0.436658959), (4.18543295, -0.738004755), (4.121904795, -1.035567895))
            Line((4.121904795, -1.035567895), (4.979646072, -2.875))
        make_face()
        with BuildLine():
            Line((3.823212475, 1.856218299), (5.66264458, 0.998477022))
            ThreePointArc((5.66264458, 0.998477022), (4.979646072, 2.875), (3.696028756, 4.404755548))
            Line((3.696028756, 4.404755548), (3.519138439, 2.382889978))
            ThreePointArc((3.519138439, 2.382889978), (3.680607966, 2.125), (3.823212475, 1.856218299))
        make_face()
        with BuildLine():
            ThreePointArc((1.966615824, -5.40323257), (3.696028756, -4.404755548), (4.979646072, -2.875))
            Line((4.979646072, -2.875), (2.957780502, -3.051890317))
            ThreePointArc((2.957780502, -3.051890317), (2.731847341, -3.255688883), (2.491912051, -3.442800362))
            Line((2.491912051, -3.442800362), (1.966615824, -5.40323257))
        make_face()
        with BuildLine():
            Line((1.735596548, 3.879459321), (3.696028756, 4.404755548))
            ThreePointArc((3.696028756, 4.404755548), (1.966615824, 5.403232569), (0, 5.75))
            Line((0, 5.75), (1.164124293, 4.087458211))
            ThreePointArc((1.164124293, 4.087458211), (1.453585609, 3.993693638), (1.735596548, 3.879459321))
        make_face()
        with BuildLine():
            ThreePointArc((-1.966615824, -5.40323257), (0, -5.75), (1.966615824, -5.40323257))
            Line((1.966615824, -5.40323257), (0.304074036, -4.239108277))
            ThreePointArc((0.304074036, -4.239108277), (0, -4.25), (-0.304074036, -4.239108277))
            Line((-0.304074036, -4.239108277), (-1.966615824, -5.40323257))
        make_face()
        with BuildLine():
            Line((-1.164124293, 4.087458211), (0, 5.75))
            ThreePointArc((0, 5.75), (-1.966615824, 5.403232569), (-3.696028756, 4.404755548))
            Line((-3.696028756, 4.404755548), (-1.735596548, 3.879459321))
            ThreePointArc((-1.735596548, 3.879459321), (-1.453585609, 3.993693638), (-1.164124293, 4.087458211))
        make_face()
        with BuildLine():
            ThreePointArc((-4.979646072, -2.875), (-3.696028756, -4.404755548), (-1.966615824, -5.40323257))
            Line((-1.966615824, -5.40323257), (-2.491912051, -3.442800362))
            ThreePointArc((-2.491912051, -3.442800362), (-2.731847341, -3.255688883), (-2.957780502, -3.051890317))
            Line((-2.957780502, -3.051890317), (-4.979646072, -2.875))
        make_face()
        with BuildLine():
            Line((-3.519138439, 2.382889978), (-3.696028756, 4.404755548))
            ThreePointArc((-3.696028756, 4.404755548), (-4.979646072, 2.875), (-5.66264458, 0.998477022))
            Line((-5.66264458, 0.998477022), (-3.823212475, 1.856218299))
            ThreePointArc((-3.823212475, 1.856218299), (-3.680607966, 2.125), (-3.519138439, 2.382889978))
        make_face()
        with BuildLine():
            ThreePointArc((-5.66264458, 0.998477022), (-5.66264458, -0.998477021), (-4.979646072, -2.875))
            Line((-4.979646072, -2.875), (-4.121904795, -1.035567895))
            ThreePointArc((-4.121904795, -1.035567895), (-4.18543295, -0.738004755), (-4.227508599, -0.436658959))
            Line((-4.227508599, -0.436658959), (-5.66264458, 0.998477022))
        make_face()
    extrude(amount=SPLIT1_7_DEPTH)

    # Split1 8 outline → Split1 8 (add)
    with BuildSketch(Plane.XY.offset(SPLIT1_START_5)):
        Circle(SPLIT1_8_OUTLINE_R)
    extrude(amount=SPLIT1_8_DEPTH)


with BuildPart() as body_5:
    # Split1 9 outline → Split1 9 (new body)
    with BuildSketch(Plane.XY.offset(SPLIT1_START_7)):
        Polygon((10, -5.773502692), (10, 5.773502692), (0, 11.547005384), (-10, 5.773502692), (-10, -5.773502692), (0, -11.547005384), align=None)
    extrude(amount=SPLIT1_9_DEPTH)

    # Split1 10 outline → Split1 10 (add)
    with BuildSketch(Plane.XY.offset(SPLIT1_START_4)):
        with BuildLine():
            Line((-2.8, -1.077032961), (2.8, -1.077032961))
            ThreePointArc((2.8, -1.077032961), (0, 3), (-2.8, -1.077032961))
        make_face()
    extrude(amount=SPLIT1_10_DEPTH)


solid = Compound([part.part, body_2.part, body_3.part, body_4.part, body_5.part])
